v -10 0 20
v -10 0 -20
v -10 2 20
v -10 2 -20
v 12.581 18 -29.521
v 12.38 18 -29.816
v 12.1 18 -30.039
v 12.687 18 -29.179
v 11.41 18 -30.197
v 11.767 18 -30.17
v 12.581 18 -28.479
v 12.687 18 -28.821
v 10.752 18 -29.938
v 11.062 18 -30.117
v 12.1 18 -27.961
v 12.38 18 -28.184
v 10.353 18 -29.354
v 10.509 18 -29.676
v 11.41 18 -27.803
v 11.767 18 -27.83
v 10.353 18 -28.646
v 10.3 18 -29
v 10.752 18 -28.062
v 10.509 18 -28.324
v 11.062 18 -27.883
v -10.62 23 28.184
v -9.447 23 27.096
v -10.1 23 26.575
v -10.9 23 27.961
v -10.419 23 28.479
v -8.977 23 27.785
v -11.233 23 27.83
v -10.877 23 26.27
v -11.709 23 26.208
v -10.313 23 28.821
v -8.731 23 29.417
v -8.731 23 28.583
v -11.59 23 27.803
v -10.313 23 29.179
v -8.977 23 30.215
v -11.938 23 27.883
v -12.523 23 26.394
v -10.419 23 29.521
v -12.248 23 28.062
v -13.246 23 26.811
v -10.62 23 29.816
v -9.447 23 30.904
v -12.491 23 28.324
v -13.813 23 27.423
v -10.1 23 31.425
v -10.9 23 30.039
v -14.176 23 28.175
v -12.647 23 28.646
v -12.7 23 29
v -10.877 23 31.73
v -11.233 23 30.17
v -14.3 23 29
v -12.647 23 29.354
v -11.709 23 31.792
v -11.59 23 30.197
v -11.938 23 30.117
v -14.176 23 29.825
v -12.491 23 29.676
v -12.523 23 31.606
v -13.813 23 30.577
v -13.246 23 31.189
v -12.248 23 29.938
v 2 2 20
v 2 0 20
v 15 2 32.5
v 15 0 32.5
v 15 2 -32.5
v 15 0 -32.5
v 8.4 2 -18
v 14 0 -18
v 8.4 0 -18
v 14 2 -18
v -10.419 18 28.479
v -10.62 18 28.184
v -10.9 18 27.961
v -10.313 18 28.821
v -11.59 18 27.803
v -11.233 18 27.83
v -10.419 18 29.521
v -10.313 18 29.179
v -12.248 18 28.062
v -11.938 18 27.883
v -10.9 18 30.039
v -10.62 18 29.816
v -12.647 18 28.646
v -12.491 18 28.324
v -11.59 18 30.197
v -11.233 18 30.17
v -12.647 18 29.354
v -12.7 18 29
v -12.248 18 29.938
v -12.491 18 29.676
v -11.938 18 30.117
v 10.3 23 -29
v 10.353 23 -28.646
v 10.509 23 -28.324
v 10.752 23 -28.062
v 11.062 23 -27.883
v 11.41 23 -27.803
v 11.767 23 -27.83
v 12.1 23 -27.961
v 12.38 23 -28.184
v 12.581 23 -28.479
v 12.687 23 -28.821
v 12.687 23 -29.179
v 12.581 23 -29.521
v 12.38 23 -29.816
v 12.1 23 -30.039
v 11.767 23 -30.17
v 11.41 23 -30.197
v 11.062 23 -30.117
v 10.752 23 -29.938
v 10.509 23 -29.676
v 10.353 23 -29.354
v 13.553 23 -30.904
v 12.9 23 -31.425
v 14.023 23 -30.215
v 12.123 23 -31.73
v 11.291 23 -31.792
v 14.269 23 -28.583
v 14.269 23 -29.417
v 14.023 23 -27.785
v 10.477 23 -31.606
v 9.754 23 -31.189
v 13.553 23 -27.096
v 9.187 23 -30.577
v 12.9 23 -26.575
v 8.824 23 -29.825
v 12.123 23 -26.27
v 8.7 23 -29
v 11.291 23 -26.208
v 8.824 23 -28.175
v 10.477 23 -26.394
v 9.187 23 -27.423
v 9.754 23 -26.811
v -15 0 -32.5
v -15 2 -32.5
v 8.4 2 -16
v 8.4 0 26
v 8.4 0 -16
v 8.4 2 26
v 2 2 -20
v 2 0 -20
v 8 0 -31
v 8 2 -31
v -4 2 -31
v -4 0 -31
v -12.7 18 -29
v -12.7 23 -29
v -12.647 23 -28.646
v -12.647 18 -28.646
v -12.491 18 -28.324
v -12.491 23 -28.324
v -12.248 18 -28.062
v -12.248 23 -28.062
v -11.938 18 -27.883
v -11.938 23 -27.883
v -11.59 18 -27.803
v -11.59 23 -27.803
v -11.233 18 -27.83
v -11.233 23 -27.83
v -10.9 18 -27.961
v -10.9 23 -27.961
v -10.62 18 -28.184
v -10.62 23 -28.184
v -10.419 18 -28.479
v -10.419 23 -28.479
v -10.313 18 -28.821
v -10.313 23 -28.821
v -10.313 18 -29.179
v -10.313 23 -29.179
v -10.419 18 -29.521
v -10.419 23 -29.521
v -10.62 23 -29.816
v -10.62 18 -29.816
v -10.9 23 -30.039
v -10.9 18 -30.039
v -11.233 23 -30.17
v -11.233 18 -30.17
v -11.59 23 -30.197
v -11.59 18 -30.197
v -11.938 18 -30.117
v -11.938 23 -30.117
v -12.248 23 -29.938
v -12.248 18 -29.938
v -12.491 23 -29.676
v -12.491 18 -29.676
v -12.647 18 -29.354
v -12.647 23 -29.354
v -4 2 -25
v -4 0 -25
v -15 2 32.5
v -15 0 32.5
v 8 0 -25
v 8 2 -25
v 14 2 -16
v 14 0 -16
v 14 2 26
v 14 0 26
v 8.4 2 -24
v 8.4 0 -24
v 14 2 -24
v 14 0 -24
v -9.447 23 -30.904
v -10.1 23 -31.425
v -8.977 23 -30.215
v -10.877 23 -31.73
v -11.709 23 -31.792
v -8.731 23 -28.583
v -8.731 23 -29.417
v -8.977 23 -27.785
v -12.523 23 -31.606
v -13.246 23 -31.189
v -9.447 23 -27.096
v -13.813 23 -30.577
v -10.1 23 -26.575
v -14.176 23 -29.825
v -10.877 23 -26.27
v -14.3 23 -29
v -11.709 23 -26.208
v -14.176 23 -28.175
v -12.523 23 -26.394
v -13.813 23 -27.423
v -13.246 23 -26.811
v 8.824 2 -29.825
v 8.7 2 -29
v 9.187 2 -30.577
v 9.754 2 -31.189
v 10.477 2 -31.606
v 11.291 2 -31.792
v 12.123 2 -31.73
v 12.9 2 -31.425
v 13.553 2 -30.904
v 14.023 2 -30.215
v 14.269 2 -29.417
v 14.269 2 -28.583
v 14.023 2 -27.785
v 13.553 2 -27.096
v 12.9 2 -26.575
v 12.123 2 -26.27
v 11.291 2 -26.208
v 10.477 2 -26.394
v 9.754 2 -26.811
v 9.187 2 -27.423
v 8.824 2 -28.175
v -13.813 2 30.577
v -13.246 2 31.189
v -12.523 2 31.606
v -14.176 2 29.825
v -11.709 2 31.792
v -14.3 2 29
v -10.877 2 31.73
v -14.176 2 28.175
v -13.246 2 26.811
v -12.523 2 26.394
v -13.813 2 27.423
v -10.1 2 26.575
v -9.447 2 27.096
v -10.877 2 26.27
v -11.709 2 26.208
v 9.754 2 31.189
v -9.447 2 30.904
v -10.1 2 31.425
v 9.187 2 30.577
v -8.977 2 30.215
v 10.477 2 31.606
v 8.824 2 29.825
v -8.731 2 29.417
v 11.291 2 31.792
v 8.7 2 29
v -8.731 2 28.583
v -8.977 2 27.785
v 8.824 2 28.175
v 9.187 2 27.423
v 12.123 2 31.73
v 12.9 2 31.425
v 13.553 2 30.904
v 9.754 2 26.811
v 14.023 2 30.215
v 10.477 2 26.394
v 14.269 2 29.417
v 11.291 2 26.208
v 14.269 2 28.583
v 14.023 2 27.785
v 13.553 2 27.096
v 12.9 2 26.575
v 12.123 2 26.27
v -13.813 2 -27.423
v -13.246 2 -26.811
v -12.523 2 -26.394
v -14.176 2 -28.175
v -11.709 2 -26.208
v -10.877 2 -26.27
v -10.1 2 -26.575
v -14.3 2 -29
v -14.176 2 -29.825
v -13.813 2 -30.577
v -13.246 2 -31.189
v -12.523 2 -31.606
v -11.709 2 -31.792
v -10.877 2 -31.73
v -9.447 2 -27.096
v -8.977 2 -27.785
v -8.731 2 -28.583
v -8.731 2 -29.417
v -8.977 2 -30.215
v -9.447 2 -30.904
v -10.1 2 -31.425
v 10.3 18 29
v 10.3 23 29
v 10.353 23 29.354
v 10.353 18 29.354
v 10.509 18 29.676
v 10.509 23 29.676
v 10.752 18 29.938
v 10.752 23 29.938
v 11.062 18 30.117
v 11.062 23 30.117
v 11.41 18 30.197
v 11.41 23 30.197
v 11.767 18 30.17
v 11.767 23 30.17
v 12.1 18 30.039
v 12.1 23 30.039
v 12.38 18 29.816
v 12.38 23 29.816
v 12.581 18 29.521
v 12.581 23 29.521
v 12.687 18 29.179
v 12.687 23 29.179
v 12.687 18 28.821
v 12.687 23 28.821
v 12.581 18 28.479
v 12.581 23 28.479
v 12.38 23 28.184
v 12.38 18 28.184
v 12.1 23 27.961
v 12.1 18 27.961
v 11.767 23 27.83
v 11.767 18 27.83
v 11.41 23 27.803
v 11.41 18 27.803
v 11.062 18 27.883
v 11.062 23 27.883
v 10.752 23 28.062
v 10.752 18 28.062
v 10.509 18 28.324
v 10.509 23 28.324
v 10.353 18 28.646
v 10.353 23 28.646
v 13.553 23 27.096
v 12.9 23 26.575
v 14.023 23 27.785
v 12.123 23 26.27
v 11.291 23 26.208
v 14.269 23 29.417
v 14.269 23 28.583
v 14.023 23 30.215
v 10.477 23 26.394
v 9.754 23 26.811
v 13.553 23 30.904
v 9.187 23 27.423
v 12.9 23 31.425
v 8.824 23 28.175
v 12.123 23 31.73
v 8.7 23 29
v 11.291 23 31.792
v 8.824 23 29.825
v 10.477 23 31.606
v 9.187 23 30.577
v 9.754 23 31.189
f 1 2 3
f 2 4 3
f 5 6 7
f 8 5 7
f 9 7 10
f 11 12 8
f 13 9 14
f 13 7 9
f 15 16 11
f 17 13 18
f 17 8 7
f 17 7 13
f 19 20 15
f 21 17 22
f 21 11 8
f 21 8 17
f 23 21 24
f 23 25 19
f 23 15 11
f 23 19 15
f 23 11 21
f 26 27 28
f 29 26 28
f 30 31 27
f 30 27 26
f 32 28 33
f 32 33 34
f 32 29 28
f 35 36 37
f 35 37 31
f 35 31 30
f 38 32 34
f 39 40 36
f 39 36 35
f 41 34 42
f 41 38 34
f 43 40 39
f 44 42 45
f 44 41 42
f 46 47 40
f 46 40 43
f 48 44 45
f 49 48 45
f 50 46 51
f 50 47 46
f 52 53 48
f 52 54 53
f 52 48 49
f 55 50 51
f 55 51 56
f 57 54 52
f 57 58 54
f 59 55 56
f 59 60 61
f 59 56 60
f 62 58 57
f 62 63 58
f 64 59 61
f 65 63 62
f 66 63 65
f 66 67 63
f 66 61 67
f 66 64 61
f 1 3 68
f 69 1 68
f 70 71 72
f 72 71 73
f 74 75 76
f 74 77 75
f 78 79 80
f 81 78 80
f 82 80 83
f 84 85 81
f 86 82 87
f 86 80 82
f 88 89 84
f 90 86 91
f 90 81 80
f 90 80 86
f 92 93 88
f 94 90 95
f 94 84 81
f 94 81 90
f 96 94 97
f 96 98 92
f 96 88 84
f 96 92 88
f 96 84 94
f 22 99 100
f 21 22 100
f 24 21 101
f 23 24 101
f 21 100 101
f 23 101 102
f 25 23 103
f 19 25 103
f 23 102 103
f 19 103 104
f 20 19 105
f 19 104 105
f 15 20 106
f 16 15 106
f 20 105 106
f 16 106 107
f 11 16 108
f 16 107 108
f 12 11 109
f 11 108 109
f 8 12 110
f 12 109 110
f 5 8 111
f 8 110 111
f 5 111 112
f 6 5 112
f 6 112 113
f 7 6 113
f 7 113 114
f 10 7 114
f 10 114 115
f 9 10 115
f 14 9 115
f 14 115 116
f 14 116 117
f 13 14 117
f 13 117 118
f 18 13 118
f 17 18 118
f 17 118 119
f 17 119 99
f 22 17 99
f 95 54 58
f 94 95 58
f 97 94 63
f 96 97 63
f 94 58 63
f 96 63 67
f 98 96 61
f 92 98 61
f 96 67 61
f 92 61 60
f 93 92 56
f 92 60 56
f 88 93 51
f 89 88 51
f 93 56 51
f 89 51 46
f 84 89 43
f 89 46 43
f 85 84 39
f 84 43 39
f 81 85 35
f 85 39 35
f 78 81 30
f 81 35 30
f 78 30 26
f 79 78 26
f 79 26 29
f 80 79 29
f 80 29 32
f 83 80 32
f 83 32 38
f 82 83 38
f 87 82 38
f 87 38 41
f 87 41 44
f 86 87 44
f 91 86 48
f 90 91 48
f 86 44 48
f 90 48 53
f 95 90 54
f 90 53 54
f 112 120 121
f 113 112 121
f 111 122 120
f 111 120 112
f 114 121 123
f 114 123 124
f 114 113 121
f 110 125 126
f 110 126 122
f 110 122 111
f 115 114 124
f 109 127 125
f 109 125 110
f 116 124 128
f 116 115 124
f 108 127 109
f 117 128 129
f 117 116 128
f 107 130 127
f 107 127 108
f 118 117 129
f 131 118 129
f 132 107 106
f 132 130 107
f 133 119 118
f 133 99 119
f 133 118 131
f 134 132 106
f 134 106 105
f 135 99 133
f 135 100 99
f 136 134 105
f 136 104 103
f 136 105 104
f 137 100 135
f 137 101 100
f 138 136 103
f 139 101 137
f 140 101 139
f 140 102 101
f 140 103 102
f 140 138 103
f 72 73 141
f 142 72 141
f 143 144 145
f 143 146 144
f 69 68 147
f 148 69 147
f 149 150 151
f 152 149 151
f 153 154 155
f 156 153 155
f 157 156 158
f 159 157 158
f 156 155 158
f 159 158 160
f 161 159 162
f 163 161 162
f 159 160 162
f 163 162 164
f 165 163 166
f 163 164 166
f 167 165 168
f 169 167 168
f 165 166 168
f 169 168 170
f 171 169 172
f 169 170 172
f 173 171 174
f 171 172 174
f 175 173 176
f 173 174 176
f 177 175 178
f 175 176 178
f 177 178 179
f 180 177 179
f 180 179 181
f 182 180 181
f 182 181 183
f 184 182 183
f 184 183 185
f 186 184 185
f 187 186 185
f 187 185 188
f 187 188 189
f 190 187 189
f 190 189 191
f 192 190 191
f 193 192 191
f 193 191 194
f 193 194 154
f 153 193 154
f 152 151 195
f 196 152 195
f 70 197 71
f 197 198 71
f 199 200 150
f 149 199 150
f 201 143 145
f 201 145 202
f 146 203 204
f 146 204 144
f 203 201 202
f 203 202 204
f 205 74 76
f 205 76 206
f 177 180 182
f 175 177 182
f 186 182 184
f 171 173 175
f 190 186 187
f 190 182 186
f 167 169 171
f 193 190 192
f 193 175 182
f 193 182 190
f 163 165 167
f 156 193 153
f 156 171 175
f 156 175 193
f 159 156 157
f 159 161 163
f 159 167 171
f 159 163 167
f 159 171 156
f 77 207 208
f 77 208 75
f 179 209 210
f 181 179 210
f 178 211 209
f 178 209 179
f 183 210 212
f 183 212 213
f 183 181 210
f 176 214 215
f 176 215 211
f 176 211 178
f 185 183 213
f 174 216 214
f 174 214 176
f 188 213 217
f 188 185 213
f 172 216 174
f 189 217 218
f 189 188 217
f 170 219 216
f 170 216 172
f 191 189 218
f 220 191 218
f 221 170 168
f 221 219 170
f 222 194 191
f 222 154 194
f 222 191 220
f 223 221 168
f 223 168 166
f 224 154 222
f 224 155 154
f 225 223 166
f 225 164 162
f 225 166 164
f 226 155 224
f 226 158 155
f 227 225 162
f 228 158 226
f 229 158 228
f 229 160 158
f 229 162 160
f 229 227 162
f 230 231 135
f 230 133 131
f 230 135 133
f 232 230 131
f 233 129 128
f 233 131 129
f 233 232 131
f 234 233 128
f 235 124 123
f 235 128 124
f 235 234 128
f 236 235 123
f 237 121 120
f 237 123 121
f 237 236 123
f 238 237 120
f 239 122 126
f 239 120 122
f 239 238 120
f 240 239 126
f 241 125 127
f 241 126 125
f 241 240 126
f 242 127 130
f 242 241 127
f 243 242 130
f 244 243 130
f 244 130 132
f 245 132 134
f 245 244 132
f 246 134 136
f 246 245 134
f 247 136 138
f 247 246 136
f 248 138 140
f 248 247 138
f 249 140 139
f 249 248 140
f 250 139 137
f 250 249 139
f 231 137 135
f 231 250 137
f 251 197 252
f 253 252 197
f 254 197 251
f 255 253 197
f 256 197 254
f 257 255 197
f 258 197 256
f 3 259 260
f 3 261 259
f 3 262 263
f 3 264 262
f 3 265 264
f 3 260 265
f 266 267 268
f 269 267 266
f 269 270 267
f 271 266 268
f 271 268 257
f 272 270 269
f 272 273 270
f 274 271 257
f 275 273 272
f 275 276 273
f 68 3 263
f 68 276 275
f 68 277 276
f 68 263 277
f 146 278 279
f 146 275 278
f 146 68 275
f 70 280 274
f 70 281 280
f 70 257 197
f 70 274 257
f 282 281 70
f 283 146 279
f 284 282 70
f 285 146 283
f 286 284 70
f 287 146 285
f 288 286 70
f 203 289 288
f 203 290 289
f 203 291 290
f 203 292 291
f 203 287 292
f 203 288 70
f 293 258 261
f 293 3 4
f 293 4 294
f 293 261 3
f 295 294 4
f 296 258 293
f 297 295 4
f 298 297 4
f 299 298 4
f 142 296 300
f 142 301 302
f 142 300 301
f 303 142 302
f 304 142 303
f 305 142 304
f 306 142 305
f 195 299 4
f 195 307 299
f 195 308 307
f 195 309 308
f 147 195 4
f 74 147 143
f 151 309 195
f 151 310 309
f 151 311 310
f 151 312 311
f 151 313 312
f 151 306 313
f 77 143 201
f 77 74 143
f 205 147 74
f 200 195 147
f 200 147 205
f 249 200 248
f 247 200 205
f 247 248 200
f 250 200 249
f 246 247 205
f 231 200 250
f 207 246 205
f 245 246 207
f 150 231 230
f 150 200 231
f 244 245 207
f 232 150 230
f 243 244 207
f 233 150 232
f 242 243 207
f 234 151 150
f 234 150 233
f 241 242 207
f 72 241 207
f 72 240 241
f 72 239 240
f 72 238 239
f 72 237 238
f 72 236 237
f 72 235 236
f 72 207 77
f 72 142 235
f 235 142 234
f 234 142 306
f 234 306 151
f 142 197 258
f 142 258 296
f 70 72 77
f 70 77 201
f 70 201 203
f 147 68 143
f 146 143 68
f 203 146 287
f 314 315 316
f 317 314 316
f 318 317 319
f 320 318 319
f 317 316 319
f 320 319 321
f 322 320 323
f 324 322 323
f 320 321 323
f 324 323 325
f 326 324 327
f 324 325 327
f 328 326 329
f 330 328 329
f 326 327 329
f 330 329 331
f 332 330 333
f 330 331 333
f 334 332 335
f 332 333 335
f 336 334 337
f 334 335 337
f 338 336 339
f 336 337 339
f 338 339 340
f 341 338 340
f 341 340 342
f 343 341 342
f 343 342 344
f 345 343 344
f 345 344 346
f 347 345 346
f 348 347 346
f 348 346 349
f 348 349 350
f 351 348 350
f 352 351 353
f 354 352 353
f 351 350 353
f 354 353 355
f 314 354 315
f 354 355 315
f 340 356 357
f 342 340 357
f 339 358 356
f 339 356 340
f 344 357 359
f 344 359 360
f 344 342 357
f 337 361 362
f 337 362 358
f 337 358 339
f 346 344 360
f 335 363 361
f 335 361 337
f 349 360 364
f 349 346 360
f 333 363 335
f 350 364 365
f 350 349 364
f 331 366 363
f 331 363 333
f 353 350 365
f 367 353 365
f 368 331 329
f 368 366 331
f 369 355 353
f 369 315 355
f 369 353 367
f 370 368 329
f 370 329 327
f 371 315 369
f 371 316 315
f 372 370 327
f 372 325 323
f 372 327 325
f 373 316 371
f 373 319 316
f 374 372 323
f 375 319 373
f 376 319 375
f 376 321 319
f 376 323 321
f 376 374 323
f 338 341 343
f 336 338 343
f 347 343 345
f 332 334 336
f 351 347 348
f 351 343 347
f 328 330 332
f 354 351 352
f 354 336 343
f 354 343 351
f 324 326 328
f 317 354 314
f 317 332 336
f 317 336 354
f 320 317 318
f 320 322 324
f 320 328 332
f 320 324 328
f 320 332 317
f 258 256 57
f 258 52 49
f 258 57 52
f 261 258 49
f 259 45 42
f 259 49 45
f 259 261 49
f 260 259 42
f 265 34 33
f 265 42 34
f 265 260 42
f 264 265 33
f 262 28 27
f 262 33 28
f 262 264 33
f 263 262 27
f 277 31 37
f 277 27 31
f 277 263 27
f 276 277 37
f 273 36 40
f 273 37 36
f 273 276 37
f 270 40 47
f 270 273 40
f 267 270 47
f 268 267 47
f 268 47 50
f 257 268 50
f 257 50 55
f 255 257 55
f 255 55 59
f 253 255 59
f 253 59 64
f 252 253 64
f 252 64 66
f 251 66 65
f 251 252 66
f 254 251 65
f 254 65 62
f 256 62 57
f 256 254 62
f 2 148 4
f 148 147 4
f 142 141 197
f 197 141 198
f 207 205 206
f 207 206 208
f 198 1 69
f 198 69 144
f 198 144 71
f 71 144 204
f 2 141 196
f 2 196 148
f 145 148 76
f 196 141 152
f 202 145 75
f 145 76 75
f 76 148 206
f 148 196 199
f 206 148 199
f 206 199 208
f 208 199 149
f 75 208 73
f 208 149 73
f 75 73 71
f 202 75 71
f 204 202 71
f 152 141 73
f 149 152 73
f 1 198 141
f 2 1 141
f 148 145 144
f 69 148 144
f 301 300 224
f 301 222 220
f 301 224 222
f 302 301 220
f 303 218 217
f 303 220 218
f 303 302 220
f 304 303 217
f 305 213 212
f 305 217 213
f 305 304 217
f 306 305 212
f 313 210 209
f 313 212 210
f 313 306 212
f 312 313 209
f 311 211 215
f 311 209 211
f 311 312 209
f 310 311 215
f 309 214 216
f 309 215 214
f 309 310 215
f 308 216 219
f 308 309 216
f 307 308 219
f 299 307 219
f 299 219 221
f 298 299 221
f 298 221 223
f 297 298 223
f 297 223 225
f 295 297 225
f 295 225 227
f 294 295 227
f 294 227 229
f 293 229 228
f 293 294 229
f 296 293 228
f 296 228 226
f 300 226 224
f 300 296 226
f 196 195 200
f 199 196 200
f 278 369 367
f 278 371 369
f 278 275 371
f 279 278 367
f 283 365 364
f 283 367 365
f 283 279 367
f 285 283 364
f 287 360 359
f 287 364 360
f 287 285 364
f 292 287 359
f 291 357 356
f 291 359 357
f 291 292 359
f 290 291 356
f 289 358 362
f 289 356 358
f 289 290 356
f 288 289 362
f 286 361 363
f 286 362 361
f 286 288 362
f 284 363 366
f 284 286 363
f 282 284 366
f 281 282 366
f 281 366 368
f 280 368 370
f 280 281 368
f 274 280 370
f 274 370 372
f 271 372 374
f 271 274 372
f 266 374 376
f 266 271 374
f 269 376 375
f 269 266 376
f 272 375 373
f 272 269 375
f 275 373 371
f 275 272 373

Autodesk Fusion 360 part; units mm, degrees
sketch "Sketch1" plane through (0, 0, 0) normal (0, 1, 0) x (1, 0, 0)
  line L0 (15, 32.5) -> (-15, 32.5)
  line L1 (-15, 32.5) -> (-15, -32.5)
  line L2 (-15, -32.5) -> (15, -32.5)
  line L3 (15, -32.5) -> (15, 32.5)
  line L4 (15, 32.5) -> (-15, -32.5) construction
  line L5 (-15, 32.5) -> (15, -32.5) construction
  dimension "d1" = 30
  dimension "d2" = 65
extrude "Extrude1" add sketch "Sketch1" along normal blind 2
sketch "Sketch2" plane through (0, 2, 0) normal (0, 1, 0) x (-1, 0, 0)
  line L0 (-15, 32.5) -> (-15, -32.5)
  line L1 (-15, -32.5) -> (15, -32.5)
  line L2 (15, -32.5) -> (15, 32.5)
  line L3 (15, 32.5) -> (-15, 32.5)
  circle A0 centre (-11.5, -29) radius 2.8
  circle A1 centre (11.5, -29) radius 2.8
  circle A2 centre (-11.5, 29) radius 2.8
  circle A3 centre (11.5, 29) radius 2.8
  dimension "d5" = 5.6
  dimension "d6" = 3.5
  dimension "d7" = 3.5
  dimension "d8" = 5.6
  dimension "d9" = 3.5
  dimension "d10" = 3.5
  dimension "d11" = 5.6
  dimension "d12" = 3.5
  dimension "d13" = 3.5
  dimension "d14" = 5.6
  dimension "d15" = 3.5
  dimension "d16" = 3.5
extrude "Extrude2" add sketch "Sketch2" along normal blind 21 contours A0 | A1 | A2 | A3
sketch "Sketch3" plane through (0, 23, 0) normal (0, 1, 0) x (-1, 0, 0)
  circle A0 centre (-11.5, -29) radius 2.8
  circle A1 centre (-11.5, -29) radius 1.2
  circle A2 centre (11.5, -29) radius 1.2
  circle A3 centre (11.5, -29) radius 2.8
  circle A4 centre (-11.5, 29) radius 1.2
  circle A5 centre (-11.5, 29) radius 2.8
  circle A6 centre (11.5, 29) radius 1.2
  circle A7 centre (11.5, 29) radius 2.8
  dimension "d19" = 2.4
  dimension "d20" = 2.4
  dimension "d21" = 2.4
  dimension "d22" = 2.4
extrude "Extrude3" cut sketch "Sketch3" against normal blind 5 contours A1 | A2 | A4 | A6
sketch "Sketch4" plane through (0, 2, 0) normal (0, 1, 0) x (-1, 0, 0)
  circle A0 centre (11.5, -29) radius 2.8
  circle A1 centre (11.5, 29) radius 2.8
  circle A2 centre (-11.5, -29) radius 2.8
  circle A3 centre (-11.5, 29) radius 2.8
  line L0 (-15, 32.5) -> (-15, -32.5)
  line L1 (-15, -32.5) -> (15, -32.5)
  line L2 (15, -32.5) -> (15, 32.5)
  line L3 (15, 32.5) -> (-15, 32.5)
  line L4 (-14, 26) -> (-8.4, 26)
  line L5 (-8.4, 26) -> (-8.4, -24)
  line L6 (-8.4, -24) -> (-14, -24)
  line L7 (-14, -24) -> (-14, 26)
  dimension "d25" = 5.6
  dimension "d26" = 6.5
  dimension "d27" = 1
  dimension "d28" = 50
extrude "Extrude4" cut sketch "Sketch4" against normal blind 5 contours L4 L5 L6 L7
sketch "Sketch5" plane through (0, 2, 0) normal (0, 1, 0) x (-1, 0, 0)
  line L0 (-8.4, 26) -> (-8.4, -24)
  line L1 (-8.4, -24) -> (-14, -24)
  line L2 (-14, -24) -> (-14, 26)
  line L3 (-14, 26) -> (-8.4, 26)
  circle A0 centre (11.5, -29) radius 2.8
  circle A1 centre (11.5, 29) radius 2.8
  circle A2 centre (-11.5, -29) radius 2.8
  circle A3 centre (-11.5, 29) radius 2.8
  line L4 (-15, 32.5) -> (-15, -32.5)
  line L5 (-15, -32.5) -> (15, -32.5)
  line L6 (15, -32.5) -> (15, 32.5)
  line L7 (15, 32.5) -> (-15, 32.5)
  line L8 (-14, -18) -> (-8, -18)
  line L9 (-8, -18) -> (-8, -16)
  line L10 (-8, -16) -> (-14, -16)
  line L11 (-14, -16) -> (-14, -18)
  dimension "d31" = 6
  dimension "d32" = 2
extrude "Extrude5" add sketch "Sketch5" against normal blind 2 contours L0 L2 L8 L10 L11
sketch "Sketch6" plane through (0, 2, 0) normal (0, 1, 0) x (-1, 0, 0)
  line L0 (-14, -16) -> (-14, 26)
  line L1 (-14, 26) -> (-8.4, 26)
  line L2 (-8.4, 26) -> (-8.4, -16)
  line L3 (-8.4, -16) -> (-14, -16)
  line L4 (-14, -18) -> (-8.4, -18)
  line L5 (-8.4, -18) -> (-8.4, -24)
  line L6 (-8.4, -24) -> (-14, -24)
  line L7 (-14, -24) -> (-14, -18)
  circle A0 centre (11.5, -29) radius 2.8
  circle A1 centre (11.5, 29) radius 2.8
  circle A2 centre (-11.5, -29) radius 2.8
  circle A3 centre (-11.5, 29) radius 2.8
  line L8 (-15, 32.5) -> (-15, -32.5)
  line L9 (-15, -32.5) -> (15, -32.5)
  line L10 (15, -32.5) -> (15, 32.5)
  line L11 (15, 32.5) -> (-15, 32.5)
  line L12 (10, 20) -> (-2, 20)
  line L13 (-2, 20) -> (-2, -20)
  line L14 (-2, -20) -> (10, -20)
  line L15 (10, -20) -> (10, 20)
extrude "Extrude6" cut sketch "Sketch6" against normal blind 2 contours L12 L13 L14 L15
sketch "Sketch7" plane through (0, 2, 0) normal (0, 1, 0) x (-1, 0, 0)
  line L0 (-2, 20) -> (10, 20)
  line L1 (10, 20) -> (10, -20)
  line L2 (10, -20) -> (-2, -20)
  line L3 (-2, -20) -> (-2, 20)
  line L4 (-14, -16) -> (-14, 26)
  line L5 (-14, 26) -> (-8.4, 26)
  line L6 (-8.4, 26) -> (-8.4, -16)
  line L7 (-8.4, -16) -> (-14, -16)
  line L8 (-14, -18) -> (-8.4, -18)
  line L9 (-8.4, -18) -> (-8.4, -24)
  line L10 (-8.4, -24) -> (-14, -24)
  line L11 (-14, -24) -> (-14, -18)
  circle A0 centre (11.5, -29) radius 2.8
  circle A1 centre (11.5, 29) radius 2.8
  circle A2 centre (-11.5, -29) radius 2.8
  circle A3 centre (-11.5, 29) radius 2.8
  line L12 (-15, 32.5) -> (-15, -32.5)
  line L13 (-15, -32.5) -> (15, -32.5)
  line L14 (15, -32.5) -> (15, 32.5)
  line L15 (15, 32.5) -> (-15, 32.5)
  line L16 (-8, -31) -> (4, -31)
  line L17 (4, -31) -> (4, -25)
  line L18 (4, -25) -> (-8, -25)
  line L19 (-8, -25) -> (-8, -31)
extrude "Extrude7" cut sketch "Sketch7" against normal blind 2 contours L16 L17 L18 L19
